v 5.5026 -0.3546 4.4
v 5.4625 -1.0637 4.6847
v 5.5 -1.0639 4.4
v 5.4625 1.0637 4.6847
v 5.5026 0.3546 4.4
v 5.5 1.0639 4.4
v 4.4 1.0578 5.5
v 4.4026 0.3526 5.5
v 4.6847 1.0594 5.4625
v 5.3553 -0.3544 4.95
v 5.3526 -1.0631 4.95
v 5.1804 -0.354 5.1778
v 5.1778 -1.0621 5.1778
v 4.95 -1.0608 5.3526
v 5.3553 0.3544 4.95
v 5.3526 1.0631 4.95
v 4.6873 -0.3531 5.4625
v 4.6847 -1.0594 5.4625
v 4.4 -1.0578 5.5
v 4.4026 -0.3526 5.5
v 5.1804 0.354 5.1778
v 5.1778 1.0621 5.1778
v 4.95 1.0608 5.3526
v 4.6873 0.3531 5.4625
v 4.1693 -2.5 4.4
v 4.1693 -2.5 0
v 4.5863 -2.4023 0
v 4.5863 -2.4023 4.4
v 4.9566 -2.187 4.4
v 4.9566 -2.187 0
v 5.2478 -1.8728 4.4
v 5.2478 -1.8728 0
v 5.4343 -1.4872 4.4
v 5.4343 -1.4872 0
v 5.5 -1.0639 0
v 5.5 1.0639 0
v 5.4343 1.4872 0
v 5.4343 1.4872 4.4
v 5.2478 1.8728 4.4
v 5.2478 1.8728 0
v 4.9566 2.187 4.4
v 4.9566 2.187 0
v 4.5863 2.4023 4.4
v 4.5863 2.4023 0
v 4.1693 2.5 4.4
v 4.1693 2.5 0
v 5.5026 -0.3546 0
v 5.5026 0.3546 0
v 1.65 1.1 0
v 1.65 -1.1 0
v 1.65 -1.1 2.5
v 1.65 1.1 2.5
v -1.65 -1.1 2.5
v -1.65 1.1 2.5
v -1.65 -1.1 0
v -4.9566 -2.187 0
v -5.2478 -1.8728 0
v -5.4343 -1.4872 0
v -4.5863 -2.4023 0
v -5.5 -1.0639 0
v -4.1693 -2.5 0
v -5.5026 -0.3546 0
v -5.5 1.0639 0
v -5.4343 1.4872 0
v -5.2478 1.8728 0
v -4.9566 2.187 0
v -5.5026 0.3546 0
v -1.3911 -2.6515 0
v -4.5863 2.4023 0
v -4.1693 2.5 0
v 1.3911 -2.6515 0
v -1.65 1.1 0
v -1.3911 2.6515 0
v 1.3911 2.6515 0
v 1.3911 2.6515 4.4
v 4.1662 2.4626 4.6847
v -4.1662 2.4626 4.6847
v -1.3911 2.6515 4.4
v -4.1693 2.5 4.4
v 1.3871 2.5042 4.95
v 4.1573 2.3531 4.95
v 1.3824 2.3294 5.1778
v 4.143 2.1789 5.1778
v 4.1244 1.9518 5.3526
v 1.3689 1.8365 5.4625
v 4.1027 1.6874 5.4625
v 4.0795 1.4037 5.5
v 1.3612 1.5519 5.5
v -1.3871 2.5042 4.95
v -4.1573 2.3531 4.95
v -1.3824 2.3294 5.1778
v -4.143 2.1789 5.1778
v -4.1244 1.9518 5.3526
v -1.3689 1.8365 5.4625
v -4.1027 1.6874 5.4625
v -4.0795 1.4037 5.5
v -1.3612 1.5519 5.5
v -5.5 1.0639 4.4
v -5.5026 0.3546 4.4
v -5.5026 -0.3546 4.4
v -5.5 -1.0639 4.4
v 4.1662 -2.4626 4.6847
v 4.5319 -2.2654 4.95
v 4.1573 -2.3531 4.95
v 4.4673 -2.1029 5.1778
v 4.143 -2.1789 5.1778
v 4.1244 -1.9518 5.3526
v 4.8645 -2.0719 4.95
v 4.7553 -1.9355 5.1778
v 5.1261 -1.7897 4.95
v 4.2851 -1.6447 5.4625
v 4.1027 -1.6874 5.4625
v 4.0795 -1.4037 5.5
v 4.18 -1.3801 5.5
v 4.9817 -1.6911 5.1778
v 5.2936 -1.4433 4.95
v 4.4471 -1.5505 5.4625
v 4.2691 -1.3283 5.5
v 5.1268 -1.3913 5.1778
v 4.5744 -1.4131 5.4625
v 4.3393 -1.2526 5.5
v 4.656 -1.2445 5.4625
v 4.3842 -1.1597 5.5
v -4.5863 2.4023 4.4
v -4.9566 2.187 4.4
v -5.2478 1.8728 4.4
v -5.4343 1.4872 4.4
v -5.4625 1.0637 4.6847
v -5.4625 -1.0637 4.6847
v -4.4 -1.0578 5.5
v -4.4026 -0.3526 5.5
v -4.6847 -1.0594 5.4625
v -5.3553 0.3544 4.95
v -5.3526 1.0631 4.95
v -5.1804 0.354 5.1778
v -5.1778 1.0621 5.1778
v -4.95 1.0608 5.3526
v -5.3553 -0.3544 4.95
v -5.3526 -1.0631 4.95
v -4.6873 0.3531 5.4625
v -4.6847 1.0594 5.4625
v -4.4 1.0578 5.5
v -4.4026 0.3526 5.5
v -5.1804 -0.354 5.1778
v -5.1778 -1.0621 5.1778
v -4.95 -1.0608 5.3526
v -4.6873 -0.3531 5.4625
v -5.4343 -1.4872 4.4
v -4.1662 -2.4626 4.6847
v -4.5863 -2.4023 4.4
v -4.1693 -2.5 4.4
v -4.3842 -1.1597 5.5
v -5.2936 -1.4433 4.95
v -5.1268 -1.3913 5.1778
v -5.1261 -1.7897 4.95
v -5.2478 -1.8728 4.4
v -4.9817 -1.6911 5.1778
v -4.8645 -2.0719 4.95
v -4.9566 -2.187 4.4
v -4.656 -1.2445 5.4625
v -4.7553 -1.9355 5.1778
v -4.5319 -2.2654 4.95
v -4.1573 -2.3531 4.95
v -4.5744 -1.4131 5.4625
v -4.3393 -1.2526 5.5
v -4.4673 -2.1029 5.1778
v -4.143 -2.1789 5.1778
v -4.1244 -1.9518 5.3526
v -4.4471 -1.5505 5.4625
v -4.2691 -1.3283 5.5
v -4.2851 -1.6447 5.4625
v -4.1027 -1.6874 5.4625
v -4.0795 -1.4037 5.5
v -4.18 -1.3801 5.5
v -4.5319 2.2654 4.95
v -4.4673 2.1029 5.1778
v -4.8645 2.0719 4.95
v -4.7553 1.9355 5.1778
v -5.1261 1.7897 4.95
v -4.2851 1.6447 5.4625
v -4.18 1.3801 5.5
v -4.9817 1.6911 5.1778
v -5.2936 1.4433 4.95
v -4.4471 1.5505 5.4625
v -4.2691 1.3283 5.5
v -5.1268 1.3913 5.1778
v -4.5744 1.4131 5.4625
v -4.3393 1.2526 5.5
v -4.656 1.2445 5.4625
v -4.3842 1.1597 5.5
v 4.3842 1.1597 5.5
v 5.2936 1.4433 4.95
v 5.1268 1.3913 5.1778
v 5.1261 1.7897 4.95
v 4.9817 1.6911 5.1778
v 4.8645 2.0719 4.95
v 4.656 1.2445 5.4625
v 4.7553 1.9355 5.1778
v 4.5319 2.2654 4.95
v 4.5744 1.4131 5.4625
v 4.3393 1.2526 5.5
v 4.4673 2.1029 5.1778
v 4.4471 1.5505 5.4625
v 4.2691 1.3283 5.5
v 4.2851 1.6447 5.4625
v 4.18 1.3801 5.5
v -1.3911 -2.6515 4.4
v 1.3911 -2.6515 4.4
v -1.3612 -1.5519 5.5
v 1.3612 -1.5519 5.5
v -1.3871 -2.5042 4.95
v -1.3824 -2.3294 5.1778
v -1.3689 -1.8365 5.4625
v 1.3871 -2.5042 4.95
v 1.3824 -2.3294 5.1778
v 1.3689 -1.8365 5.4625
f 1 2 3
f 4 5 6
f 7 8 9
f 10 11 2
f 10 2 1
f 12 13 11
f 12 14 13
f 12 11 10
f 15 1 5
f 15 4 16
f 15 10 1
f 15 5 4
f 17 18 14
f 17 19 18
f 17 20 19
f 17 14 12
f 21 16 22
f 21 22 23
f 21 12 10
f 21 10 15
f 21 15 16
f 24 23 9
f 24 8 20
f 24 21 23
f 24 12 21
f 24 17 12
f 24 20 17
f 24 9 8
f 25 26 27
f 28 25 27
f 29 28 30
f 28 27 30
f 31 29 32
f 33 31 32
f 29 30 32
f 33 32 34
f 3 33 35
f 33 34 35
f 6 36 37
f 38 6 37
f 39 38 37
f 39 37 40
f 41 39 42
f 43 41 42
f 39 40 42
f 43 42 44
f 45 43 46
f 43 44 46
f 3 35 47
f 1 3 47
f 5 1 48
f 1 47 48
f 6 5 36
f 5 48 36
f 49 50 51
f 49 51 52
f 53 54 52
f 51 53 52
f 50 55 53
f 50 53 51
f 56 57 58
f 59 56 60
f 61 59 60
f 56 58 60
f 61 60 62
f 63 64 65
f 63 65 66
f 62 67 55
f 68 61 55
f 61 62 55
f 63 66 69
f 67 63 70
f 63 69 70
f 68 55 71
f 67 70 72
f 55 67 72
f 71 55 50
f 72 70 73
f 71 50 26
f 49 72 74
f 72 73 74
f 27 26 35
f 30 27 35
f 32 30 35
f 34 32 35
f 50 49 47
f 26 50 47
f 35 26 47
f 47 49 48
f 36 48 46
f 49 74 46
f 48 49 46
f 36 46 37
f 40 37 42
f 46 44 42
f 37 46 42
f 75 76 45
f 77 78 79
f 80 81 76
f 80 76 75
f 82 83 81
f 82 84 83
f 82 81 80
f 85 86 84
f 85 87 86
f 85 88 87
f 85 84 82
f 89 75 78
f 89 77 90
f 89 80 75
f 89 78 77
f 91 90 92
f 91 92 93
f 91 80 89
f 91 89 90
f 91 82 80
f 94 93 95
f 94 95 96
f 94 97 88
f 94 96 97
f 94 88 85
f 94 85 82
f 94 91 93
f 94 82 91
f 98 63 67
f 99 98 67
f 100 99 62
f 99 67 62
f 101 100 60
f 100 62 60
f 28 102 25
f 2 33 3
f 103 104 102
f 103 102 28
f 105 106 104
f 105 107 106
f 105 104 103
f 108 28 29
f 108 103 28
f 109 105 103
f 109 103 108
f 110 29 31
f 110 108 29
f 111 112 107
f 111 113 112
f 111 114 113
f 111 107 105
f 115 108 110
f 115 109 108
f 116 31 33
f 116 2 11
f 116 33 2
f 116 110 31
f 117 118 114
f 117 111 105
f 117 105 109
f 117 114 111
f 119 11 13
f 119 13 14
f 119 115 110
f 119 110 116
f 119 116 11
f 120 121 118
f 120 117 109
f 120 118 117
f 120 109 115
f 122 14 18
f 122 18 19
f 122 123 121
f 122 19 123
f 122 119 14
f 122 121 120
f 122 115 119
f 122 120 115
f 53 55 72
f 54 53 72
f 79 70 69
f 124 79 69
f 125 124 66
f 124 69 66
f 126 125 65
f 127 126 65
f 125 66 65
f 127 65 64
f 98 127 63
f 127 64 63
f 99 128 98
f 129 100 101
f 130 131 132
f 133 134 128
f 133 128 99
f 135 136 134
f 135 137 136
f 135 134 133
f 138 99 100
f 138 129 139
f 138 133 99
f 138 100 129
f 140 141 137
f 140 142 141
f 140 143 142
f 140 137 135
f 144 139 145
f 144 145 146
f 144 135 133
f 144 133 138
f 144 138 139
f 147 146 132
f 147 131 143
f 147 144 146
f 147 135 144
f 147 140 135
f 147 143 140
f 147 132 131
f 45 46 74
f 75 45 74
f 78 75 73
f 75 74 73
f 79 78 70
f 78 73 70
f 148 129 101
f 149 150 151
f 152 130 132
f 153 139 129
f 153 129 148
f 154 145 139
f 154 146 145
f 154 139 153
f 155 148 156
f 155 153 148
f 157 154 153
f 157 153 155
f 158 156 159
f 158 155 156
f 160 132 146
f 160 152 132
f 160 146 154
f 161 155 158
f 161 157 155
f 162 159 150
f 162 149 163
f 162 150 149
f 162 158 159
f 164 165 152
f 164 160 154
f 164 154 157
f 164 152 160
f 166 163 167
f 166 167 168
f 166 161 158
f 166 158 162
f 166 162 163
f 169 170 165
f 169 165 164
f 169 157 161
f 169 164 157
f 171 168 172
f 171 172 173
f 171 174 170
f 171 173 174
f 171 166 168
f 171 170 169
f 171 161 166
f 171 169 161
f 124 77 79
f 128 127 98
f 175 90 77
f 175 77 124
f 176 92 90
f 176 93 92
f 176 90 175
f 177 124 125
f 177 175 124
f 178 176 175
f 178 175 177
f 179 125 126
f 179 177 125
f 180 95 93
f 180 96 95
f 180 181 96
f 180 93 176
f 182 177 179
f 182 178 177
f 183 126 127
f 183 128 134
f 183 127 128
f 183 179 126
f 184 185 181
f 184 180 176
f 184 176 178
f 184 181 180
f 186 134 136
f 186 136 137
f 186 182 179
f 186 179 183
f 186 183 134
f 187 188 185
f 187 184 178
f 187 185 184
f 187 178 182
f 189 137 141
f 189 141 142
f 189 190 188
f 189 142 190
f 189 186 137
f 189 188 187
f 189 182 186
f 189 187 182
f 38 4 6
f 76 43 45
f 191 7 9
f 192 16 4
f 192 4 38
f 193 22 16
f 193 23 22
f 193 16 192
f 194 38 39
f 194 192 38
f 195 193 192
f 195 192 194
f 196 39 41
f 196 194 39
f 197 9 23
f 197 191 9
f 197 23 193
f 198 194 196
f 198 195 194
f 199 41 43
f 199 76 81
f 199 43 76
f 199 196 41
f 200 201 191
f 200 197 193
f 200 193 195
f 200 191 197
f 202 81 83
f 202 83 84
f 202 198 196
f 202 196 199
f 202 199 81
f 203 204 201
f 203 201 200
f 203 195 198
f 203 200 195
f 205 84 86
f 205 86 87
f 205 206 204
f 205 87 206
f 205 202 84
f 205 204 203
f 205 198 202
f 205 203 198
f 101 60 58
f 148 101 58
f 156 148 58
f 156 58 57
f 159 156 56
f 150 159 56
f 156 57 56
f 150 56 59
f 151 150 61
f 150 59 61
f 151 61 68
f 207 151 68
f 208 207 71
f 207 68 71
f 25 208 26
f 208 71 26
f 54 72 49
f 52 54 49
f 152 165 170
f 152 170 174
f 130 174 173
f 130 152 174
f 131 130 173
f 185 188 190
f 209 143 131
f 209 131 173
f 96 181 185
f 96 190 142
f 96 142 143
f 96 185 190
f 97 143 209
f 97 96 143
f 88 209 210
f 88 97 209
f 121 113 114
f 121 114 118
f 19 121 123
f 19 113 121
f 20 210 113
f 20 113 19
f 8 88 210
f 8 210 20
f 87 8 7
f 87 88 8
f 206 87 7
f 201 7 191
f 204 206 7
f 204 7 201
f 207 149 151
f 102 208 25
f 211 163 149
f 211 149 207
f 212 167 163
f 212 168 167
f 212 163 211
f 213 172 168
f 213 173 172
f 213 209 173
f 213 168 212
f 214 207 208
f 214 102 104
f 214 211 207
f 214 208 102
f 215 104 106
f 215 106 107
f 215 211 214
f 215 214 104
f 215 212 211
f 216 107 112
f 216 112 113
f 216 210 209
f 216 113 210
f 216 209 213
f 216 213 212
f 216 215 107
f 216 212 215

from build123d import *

# Parameters (mm, degrees)
SKETCH023_W  = 3.3
SKETCH023_H  = 2.2
PAD017_DEPTH = 2.5
PAD016_DEPTH = 5.5
FILLET001_R  = 1.1


with BuildPart() as pad_button_hole:
    # Sketch023 → Pad017 (new body)
    with BuildSketch(Plane.XY):
        Rectangle(SKETCH023_W, SKETCH023_H)
    extrude(amount=PAD017_DEPTH)


with BuildPart() as cut_button_small_final:
    # Sketch020 → Pad016 (new body)
    with BuildSketch(Plane.XY):
        with BuildLine():
            ThreePointArc((4.169285, 2.5), (0, 2.670418), (-4.169285, 2.5))
            ThreePointArc((-4.169285, 2.5), (-5.113877, 2.040693), (-5.5, 1.0639))
            ThreePointArc((-5.5, 1.0639), (-5.502959, 0), (-5.5, -1.0639))
            ThreePointArc((-5.5, -1.0639), (-5.113877, -2.040693), (-4.169285, -2.5))
            ThreePointArc((-4.169285, -2.5), (0, -2.670418), (4.169285, -2.5))
            ThreePointArc((4.169285, -2.5), (5.113877, -2.040693), (5.5, -1.0639))
            ThreePointArc((5.5, -1.0639), (5.502959, 0), (5.5, 1.0639))
            ThreePointArc((5.5, 1.0639), (5.113877, 2.040693), (4.169285, 2.5))
        make_face()
    extrude(amount=PAD016_DEPTH)

    # Fillet001
    fillet001_edges = [cut_button_small_final.edges().sort_by_distance(p)[0] for p in [
        (0, 2.670418, 5.5),
        (-5.113877, 2.040693, 5.5),
        (-5.502959, 0, 5.5),
        (-5.113877, -2.040693, 5.5),
        (0, -2.670418, 5.5),
        (5.113877, -2.040693, 5.5),
        (5.502959, 0, 5.5),
        (5.113877, 2.040693, 5.5),
    ]]
    fillet(fillet001_edges, radius=FILLET001_R)

    # Cut003: cut Pad (button hole)
    add(pad_button_hole.part, mode=Mode.SUBTRACT)


solid = cut_button_small_final.part
